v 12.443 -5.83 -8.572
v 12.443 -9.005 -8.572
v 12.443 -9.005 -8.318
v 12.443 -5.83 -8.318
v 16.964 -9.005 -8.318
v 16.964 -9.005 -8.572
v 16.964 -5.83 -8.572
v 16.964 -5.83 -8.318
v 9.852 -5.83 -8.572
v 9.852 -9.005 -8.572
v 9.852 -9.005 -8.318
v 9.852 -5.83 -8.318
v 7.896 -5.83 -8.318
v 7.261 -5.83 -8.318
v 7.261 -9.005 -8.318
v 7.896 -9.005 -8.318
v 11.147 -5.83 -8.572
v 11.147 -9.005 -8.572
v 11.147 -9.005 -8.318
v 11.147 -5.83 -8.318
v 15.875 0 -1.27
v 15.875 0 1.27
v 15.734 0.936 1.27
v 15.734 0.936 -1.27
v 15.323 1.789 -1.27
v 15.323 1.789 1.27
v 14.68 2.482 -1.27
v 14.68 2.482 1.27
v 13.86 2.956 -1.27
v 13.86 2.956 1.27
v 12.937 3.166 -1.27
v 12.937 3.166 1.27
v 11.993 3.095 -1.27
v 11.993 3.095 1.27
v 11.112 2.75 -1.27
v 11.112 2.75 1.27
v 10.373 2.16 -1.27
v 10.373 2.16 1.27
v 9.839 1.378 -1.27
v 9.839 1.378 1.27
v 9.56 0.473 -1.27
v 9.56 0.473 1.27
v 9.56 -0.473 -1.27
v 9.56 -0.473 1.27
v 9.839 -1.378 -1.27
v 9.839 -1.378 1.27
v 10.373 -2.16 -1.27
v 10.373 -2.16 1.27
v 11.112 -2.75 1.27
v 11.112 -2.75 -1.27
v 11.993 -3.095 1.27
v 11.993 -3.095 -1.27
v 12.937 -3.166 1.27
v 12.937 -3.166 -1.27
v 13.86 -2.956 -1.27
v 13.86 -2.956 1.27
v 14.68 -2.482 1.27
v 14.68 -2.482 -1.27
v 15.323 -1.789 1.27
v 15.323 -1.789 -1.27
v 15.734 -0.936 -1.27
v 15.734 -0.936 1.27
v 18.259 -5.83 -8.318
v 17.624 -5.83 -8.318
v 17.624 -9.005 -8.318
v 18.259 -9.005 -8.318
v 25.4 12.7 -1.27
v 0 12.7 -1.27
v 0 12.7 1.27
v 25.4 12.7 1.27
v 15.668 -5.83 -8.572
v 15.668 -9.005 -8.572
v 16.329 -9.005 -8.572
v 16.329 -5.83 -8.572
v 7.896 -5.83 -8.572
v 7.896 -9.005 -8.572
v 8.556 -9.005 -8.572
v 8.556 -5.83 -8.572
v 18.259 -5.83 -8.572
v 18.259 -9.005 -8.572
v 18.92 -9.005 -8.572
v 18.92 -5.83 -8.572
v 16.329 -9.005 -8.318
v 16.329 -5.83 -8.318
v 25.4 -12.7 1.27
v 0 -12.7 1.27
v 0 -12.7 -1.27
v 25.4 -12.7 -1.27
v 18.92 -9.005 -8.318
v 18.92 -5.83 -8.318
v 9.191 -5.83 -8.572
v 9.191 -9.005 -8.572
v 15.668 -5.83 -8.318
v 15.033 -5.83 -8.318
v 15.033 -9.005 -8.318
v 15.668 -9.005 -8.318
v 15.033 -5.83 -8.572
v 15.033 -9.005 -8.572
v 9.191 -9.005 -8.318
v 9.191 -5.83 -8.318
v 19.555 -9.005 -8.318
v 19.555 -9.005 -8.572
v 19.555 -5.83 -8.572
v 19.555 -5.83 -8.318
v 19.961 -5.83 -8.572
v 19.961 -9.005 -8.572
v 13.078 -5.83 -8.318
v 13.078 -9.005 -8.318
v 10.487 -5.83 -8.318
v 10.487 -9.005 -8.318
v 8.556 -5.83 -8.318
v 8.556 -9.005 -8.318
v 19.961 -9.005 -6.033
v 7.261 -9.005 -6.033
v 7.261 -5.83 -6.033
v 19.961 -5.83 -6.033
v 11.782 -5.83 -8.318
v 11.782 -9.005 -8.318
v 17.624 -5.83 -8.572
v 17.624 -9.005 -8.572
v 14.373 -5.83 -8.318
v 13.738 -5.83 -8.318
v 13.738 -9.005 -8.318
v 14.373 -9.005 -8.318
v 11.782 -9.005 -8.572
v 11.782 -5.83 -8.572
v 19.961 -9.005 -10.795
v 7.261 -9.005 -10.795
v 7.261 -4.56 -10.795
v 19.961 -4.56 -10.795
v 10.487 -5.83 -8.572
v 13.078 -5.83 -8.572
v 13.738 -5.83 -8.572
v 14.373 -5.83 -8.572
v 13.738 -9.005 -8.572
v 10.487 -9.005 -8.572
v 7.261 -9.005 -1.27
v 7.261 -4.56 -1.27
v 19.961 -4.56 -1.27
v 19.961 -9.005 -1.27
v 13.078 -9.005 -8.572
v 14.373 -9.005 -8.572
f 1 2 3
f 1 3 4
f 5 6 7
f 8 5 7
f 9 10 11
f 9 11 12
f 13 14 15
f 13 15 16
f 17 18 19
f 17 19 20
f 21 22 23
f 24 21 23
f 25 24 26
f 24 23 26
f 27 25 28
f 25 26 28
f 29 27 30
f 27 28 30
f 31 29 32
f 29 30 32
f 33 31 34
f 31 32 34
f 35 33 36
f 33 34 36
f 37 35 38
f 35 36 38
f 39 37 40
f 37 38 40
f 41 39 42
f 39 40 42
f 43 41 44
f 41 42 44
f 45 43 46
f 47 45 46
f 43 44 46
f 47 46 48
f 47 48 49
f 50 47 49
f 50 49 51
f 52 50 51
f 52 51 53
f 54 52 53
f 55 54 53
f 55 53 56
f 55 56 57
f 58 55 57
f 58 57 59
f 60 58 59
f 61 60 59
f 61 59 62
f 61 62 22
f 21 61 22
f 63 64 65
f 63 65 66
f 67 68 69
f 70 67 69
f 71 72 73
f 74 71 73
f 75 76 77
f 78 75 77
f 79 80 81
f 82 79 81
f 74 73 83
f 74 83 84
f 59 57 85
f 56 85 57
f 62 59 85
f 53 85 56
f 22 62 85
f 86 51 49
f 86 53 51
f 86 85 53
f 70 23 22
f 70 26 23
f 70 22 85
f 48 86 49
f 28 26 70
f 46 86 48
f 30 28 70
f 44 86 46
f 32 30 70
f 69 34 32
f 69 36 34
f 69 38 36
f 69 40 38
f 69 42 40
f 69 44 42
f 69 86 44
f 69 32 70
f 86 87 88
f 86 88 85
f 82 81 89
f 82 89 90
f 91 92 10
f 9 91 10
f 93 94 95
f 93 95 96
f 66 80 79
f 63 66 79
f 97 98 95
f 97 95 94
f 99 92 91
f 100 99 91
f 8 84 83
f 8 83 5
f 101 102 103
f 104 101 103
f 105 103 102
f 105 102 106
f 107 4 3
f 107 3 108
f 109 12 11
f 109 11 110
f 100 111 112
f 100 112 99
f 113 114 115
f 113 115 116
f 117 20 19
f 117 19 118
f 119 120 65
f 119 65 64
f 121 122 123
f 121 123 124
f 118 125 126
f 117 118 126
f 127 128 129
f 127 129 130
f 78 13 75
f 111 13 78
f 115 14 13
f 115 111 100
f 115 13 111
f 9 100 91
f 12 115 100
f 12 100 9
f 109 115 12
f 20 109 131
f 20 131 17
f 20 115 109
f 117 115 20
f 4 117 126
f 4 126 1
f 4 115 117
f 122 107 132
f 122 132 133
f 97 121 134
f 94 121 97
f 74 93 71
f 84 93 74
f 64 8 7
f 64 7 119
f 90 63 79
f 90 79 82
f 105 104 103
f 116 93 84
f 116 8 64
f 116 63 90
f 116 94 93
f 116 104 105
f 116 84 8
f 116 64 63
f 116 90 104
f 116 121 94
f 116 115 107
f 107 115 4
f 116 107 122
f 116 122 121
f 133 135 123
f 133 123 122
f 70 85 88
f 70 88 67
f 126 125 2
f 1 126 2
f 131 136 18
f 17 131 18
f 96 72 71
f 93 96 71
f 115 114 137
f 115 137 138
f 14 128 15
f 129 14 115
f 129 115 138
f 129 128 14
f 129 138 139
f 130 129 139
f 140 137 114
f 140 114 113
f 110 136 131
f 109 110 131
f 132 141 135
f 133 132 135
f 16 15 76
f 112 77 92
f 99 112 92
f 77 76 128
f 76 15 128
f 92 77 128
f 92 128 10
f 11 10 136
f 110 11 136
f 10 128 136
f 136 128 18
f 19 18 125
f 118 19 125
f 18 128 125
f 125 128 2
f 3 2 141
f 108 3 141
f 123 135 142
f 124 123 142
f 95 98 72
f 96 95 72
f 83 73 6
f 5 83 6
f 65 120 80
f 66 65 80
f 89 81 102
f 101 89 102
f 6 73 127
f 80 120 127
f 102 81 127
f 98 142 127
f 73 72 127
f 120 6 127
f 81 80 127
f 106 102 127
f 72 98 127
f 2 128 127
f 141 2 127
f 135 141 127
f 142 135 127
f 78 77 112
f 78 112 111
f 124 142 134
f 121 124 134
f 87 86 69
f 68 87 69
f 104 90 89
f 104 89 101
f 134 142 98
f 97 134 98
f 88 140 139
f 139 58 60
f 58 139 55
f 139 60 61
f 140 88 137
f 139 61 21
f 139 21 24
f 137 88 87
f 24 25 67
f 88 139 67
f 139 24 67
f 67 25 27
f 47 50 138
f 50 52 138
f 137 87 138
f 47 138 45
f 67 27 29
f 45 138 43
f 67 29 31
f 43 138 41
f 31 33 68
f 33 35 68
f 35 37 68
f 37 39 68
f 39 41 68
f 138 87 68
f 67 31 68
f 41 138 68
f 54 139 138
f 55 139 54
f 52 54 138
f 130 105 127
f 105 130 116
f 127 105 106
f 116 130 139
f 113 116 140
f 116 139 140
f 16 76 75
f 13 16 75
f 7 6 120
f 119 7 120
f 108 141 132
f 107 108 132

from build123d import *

# Parameters (mm, degrees)
F0_W     = 25.4
F0_H     = 2.54
F1_DEPTH = 25.4
F2_R     = 3.175
F3_DEPTH = 25.4
F4_W     = 12.7
F4_H     = 4.445
F5_DEPTH = 9.525
F6_W     = 12.7
F6_H     = 2.54
F7_DEPTH = 3.175
F8_W     = 0.635
F8_H     = 3.175
F9_DEPTH = 0.254


with BuildPart() as f1:
    # F0 (on Right) → F1 (new body)
    with BuildSketch(Plane.YZ):
        Rectangle(F0_W, F0_H)
    extrude(amount=F1_DEPTH)

    # F2 (on face) → F3 (cut)
    with BuildSketch(Plane.XY.offset(1.27)):
        with Locations((12.7, 0)):
            Circle(F2_R)
    extrude(amount=-F3_DEPTH, mode=Mode.SUBTRACT)

    # F4 (on face) → F5 (join)
    with BuildSketch(Plane(origin=(0, 0, -1.27), x_dir=(1, 0, 0), z_dir=(0, 0, -1))):
        with Locations((13.610998, 6.782856)):
            Rectangle(F4_W, F4_H)
    extrude(amount=F5_DEPTH)

    # F6 (on face) → F7 (cut)
    with BuildSketch(Plane.XZ.offset(9.005356)):
        with Locations((13.610998, -7.3025)):
            Rectangle(F6_W, F6_H)
    extrude(amount=-F7_DEPTH, mode=Mode.SUBTRACT)

    # F8 (on face) → F9 (join)
    with BuildSketch(Plane.XY.offset(-8.5725)):
        with Locations((8.873898, -7.417856)):
            Rectangle(F8_W, F8_H)
        with Locations((7.578498, -7.417856)):
            Rectangle(F8_W, F8_H)
        with Locations((10.169298, -7.417856)):
            Rectangle(F8_W, F8_H)
        with Locations((11.464698, -7.417856)):
            Rectangle(F8_W, F8_H)
        with Locations((12.760098, -7.417856)):
            Rectangle(F8_W, F8_H)
        with Locations((14.055498, -7.417856)):
            Rectangle(F8_W, F8_H)
        with Locations((15.350898, -7.417856)):
            Rectangle(F8_W, F8_H)
        with Locations((16.646298, -7.417856)):
            Rectangle(F8_W, F8_H)
        with Locations((17.941698, -7.417856)):
            Rectangle(F8_W, F8_H)
        with Locations((19.237098, -7.417856)):
            Rectangle(F8_W, F8_H)
    extrude(amount=F9_DEPTH)


solid = f1.part
